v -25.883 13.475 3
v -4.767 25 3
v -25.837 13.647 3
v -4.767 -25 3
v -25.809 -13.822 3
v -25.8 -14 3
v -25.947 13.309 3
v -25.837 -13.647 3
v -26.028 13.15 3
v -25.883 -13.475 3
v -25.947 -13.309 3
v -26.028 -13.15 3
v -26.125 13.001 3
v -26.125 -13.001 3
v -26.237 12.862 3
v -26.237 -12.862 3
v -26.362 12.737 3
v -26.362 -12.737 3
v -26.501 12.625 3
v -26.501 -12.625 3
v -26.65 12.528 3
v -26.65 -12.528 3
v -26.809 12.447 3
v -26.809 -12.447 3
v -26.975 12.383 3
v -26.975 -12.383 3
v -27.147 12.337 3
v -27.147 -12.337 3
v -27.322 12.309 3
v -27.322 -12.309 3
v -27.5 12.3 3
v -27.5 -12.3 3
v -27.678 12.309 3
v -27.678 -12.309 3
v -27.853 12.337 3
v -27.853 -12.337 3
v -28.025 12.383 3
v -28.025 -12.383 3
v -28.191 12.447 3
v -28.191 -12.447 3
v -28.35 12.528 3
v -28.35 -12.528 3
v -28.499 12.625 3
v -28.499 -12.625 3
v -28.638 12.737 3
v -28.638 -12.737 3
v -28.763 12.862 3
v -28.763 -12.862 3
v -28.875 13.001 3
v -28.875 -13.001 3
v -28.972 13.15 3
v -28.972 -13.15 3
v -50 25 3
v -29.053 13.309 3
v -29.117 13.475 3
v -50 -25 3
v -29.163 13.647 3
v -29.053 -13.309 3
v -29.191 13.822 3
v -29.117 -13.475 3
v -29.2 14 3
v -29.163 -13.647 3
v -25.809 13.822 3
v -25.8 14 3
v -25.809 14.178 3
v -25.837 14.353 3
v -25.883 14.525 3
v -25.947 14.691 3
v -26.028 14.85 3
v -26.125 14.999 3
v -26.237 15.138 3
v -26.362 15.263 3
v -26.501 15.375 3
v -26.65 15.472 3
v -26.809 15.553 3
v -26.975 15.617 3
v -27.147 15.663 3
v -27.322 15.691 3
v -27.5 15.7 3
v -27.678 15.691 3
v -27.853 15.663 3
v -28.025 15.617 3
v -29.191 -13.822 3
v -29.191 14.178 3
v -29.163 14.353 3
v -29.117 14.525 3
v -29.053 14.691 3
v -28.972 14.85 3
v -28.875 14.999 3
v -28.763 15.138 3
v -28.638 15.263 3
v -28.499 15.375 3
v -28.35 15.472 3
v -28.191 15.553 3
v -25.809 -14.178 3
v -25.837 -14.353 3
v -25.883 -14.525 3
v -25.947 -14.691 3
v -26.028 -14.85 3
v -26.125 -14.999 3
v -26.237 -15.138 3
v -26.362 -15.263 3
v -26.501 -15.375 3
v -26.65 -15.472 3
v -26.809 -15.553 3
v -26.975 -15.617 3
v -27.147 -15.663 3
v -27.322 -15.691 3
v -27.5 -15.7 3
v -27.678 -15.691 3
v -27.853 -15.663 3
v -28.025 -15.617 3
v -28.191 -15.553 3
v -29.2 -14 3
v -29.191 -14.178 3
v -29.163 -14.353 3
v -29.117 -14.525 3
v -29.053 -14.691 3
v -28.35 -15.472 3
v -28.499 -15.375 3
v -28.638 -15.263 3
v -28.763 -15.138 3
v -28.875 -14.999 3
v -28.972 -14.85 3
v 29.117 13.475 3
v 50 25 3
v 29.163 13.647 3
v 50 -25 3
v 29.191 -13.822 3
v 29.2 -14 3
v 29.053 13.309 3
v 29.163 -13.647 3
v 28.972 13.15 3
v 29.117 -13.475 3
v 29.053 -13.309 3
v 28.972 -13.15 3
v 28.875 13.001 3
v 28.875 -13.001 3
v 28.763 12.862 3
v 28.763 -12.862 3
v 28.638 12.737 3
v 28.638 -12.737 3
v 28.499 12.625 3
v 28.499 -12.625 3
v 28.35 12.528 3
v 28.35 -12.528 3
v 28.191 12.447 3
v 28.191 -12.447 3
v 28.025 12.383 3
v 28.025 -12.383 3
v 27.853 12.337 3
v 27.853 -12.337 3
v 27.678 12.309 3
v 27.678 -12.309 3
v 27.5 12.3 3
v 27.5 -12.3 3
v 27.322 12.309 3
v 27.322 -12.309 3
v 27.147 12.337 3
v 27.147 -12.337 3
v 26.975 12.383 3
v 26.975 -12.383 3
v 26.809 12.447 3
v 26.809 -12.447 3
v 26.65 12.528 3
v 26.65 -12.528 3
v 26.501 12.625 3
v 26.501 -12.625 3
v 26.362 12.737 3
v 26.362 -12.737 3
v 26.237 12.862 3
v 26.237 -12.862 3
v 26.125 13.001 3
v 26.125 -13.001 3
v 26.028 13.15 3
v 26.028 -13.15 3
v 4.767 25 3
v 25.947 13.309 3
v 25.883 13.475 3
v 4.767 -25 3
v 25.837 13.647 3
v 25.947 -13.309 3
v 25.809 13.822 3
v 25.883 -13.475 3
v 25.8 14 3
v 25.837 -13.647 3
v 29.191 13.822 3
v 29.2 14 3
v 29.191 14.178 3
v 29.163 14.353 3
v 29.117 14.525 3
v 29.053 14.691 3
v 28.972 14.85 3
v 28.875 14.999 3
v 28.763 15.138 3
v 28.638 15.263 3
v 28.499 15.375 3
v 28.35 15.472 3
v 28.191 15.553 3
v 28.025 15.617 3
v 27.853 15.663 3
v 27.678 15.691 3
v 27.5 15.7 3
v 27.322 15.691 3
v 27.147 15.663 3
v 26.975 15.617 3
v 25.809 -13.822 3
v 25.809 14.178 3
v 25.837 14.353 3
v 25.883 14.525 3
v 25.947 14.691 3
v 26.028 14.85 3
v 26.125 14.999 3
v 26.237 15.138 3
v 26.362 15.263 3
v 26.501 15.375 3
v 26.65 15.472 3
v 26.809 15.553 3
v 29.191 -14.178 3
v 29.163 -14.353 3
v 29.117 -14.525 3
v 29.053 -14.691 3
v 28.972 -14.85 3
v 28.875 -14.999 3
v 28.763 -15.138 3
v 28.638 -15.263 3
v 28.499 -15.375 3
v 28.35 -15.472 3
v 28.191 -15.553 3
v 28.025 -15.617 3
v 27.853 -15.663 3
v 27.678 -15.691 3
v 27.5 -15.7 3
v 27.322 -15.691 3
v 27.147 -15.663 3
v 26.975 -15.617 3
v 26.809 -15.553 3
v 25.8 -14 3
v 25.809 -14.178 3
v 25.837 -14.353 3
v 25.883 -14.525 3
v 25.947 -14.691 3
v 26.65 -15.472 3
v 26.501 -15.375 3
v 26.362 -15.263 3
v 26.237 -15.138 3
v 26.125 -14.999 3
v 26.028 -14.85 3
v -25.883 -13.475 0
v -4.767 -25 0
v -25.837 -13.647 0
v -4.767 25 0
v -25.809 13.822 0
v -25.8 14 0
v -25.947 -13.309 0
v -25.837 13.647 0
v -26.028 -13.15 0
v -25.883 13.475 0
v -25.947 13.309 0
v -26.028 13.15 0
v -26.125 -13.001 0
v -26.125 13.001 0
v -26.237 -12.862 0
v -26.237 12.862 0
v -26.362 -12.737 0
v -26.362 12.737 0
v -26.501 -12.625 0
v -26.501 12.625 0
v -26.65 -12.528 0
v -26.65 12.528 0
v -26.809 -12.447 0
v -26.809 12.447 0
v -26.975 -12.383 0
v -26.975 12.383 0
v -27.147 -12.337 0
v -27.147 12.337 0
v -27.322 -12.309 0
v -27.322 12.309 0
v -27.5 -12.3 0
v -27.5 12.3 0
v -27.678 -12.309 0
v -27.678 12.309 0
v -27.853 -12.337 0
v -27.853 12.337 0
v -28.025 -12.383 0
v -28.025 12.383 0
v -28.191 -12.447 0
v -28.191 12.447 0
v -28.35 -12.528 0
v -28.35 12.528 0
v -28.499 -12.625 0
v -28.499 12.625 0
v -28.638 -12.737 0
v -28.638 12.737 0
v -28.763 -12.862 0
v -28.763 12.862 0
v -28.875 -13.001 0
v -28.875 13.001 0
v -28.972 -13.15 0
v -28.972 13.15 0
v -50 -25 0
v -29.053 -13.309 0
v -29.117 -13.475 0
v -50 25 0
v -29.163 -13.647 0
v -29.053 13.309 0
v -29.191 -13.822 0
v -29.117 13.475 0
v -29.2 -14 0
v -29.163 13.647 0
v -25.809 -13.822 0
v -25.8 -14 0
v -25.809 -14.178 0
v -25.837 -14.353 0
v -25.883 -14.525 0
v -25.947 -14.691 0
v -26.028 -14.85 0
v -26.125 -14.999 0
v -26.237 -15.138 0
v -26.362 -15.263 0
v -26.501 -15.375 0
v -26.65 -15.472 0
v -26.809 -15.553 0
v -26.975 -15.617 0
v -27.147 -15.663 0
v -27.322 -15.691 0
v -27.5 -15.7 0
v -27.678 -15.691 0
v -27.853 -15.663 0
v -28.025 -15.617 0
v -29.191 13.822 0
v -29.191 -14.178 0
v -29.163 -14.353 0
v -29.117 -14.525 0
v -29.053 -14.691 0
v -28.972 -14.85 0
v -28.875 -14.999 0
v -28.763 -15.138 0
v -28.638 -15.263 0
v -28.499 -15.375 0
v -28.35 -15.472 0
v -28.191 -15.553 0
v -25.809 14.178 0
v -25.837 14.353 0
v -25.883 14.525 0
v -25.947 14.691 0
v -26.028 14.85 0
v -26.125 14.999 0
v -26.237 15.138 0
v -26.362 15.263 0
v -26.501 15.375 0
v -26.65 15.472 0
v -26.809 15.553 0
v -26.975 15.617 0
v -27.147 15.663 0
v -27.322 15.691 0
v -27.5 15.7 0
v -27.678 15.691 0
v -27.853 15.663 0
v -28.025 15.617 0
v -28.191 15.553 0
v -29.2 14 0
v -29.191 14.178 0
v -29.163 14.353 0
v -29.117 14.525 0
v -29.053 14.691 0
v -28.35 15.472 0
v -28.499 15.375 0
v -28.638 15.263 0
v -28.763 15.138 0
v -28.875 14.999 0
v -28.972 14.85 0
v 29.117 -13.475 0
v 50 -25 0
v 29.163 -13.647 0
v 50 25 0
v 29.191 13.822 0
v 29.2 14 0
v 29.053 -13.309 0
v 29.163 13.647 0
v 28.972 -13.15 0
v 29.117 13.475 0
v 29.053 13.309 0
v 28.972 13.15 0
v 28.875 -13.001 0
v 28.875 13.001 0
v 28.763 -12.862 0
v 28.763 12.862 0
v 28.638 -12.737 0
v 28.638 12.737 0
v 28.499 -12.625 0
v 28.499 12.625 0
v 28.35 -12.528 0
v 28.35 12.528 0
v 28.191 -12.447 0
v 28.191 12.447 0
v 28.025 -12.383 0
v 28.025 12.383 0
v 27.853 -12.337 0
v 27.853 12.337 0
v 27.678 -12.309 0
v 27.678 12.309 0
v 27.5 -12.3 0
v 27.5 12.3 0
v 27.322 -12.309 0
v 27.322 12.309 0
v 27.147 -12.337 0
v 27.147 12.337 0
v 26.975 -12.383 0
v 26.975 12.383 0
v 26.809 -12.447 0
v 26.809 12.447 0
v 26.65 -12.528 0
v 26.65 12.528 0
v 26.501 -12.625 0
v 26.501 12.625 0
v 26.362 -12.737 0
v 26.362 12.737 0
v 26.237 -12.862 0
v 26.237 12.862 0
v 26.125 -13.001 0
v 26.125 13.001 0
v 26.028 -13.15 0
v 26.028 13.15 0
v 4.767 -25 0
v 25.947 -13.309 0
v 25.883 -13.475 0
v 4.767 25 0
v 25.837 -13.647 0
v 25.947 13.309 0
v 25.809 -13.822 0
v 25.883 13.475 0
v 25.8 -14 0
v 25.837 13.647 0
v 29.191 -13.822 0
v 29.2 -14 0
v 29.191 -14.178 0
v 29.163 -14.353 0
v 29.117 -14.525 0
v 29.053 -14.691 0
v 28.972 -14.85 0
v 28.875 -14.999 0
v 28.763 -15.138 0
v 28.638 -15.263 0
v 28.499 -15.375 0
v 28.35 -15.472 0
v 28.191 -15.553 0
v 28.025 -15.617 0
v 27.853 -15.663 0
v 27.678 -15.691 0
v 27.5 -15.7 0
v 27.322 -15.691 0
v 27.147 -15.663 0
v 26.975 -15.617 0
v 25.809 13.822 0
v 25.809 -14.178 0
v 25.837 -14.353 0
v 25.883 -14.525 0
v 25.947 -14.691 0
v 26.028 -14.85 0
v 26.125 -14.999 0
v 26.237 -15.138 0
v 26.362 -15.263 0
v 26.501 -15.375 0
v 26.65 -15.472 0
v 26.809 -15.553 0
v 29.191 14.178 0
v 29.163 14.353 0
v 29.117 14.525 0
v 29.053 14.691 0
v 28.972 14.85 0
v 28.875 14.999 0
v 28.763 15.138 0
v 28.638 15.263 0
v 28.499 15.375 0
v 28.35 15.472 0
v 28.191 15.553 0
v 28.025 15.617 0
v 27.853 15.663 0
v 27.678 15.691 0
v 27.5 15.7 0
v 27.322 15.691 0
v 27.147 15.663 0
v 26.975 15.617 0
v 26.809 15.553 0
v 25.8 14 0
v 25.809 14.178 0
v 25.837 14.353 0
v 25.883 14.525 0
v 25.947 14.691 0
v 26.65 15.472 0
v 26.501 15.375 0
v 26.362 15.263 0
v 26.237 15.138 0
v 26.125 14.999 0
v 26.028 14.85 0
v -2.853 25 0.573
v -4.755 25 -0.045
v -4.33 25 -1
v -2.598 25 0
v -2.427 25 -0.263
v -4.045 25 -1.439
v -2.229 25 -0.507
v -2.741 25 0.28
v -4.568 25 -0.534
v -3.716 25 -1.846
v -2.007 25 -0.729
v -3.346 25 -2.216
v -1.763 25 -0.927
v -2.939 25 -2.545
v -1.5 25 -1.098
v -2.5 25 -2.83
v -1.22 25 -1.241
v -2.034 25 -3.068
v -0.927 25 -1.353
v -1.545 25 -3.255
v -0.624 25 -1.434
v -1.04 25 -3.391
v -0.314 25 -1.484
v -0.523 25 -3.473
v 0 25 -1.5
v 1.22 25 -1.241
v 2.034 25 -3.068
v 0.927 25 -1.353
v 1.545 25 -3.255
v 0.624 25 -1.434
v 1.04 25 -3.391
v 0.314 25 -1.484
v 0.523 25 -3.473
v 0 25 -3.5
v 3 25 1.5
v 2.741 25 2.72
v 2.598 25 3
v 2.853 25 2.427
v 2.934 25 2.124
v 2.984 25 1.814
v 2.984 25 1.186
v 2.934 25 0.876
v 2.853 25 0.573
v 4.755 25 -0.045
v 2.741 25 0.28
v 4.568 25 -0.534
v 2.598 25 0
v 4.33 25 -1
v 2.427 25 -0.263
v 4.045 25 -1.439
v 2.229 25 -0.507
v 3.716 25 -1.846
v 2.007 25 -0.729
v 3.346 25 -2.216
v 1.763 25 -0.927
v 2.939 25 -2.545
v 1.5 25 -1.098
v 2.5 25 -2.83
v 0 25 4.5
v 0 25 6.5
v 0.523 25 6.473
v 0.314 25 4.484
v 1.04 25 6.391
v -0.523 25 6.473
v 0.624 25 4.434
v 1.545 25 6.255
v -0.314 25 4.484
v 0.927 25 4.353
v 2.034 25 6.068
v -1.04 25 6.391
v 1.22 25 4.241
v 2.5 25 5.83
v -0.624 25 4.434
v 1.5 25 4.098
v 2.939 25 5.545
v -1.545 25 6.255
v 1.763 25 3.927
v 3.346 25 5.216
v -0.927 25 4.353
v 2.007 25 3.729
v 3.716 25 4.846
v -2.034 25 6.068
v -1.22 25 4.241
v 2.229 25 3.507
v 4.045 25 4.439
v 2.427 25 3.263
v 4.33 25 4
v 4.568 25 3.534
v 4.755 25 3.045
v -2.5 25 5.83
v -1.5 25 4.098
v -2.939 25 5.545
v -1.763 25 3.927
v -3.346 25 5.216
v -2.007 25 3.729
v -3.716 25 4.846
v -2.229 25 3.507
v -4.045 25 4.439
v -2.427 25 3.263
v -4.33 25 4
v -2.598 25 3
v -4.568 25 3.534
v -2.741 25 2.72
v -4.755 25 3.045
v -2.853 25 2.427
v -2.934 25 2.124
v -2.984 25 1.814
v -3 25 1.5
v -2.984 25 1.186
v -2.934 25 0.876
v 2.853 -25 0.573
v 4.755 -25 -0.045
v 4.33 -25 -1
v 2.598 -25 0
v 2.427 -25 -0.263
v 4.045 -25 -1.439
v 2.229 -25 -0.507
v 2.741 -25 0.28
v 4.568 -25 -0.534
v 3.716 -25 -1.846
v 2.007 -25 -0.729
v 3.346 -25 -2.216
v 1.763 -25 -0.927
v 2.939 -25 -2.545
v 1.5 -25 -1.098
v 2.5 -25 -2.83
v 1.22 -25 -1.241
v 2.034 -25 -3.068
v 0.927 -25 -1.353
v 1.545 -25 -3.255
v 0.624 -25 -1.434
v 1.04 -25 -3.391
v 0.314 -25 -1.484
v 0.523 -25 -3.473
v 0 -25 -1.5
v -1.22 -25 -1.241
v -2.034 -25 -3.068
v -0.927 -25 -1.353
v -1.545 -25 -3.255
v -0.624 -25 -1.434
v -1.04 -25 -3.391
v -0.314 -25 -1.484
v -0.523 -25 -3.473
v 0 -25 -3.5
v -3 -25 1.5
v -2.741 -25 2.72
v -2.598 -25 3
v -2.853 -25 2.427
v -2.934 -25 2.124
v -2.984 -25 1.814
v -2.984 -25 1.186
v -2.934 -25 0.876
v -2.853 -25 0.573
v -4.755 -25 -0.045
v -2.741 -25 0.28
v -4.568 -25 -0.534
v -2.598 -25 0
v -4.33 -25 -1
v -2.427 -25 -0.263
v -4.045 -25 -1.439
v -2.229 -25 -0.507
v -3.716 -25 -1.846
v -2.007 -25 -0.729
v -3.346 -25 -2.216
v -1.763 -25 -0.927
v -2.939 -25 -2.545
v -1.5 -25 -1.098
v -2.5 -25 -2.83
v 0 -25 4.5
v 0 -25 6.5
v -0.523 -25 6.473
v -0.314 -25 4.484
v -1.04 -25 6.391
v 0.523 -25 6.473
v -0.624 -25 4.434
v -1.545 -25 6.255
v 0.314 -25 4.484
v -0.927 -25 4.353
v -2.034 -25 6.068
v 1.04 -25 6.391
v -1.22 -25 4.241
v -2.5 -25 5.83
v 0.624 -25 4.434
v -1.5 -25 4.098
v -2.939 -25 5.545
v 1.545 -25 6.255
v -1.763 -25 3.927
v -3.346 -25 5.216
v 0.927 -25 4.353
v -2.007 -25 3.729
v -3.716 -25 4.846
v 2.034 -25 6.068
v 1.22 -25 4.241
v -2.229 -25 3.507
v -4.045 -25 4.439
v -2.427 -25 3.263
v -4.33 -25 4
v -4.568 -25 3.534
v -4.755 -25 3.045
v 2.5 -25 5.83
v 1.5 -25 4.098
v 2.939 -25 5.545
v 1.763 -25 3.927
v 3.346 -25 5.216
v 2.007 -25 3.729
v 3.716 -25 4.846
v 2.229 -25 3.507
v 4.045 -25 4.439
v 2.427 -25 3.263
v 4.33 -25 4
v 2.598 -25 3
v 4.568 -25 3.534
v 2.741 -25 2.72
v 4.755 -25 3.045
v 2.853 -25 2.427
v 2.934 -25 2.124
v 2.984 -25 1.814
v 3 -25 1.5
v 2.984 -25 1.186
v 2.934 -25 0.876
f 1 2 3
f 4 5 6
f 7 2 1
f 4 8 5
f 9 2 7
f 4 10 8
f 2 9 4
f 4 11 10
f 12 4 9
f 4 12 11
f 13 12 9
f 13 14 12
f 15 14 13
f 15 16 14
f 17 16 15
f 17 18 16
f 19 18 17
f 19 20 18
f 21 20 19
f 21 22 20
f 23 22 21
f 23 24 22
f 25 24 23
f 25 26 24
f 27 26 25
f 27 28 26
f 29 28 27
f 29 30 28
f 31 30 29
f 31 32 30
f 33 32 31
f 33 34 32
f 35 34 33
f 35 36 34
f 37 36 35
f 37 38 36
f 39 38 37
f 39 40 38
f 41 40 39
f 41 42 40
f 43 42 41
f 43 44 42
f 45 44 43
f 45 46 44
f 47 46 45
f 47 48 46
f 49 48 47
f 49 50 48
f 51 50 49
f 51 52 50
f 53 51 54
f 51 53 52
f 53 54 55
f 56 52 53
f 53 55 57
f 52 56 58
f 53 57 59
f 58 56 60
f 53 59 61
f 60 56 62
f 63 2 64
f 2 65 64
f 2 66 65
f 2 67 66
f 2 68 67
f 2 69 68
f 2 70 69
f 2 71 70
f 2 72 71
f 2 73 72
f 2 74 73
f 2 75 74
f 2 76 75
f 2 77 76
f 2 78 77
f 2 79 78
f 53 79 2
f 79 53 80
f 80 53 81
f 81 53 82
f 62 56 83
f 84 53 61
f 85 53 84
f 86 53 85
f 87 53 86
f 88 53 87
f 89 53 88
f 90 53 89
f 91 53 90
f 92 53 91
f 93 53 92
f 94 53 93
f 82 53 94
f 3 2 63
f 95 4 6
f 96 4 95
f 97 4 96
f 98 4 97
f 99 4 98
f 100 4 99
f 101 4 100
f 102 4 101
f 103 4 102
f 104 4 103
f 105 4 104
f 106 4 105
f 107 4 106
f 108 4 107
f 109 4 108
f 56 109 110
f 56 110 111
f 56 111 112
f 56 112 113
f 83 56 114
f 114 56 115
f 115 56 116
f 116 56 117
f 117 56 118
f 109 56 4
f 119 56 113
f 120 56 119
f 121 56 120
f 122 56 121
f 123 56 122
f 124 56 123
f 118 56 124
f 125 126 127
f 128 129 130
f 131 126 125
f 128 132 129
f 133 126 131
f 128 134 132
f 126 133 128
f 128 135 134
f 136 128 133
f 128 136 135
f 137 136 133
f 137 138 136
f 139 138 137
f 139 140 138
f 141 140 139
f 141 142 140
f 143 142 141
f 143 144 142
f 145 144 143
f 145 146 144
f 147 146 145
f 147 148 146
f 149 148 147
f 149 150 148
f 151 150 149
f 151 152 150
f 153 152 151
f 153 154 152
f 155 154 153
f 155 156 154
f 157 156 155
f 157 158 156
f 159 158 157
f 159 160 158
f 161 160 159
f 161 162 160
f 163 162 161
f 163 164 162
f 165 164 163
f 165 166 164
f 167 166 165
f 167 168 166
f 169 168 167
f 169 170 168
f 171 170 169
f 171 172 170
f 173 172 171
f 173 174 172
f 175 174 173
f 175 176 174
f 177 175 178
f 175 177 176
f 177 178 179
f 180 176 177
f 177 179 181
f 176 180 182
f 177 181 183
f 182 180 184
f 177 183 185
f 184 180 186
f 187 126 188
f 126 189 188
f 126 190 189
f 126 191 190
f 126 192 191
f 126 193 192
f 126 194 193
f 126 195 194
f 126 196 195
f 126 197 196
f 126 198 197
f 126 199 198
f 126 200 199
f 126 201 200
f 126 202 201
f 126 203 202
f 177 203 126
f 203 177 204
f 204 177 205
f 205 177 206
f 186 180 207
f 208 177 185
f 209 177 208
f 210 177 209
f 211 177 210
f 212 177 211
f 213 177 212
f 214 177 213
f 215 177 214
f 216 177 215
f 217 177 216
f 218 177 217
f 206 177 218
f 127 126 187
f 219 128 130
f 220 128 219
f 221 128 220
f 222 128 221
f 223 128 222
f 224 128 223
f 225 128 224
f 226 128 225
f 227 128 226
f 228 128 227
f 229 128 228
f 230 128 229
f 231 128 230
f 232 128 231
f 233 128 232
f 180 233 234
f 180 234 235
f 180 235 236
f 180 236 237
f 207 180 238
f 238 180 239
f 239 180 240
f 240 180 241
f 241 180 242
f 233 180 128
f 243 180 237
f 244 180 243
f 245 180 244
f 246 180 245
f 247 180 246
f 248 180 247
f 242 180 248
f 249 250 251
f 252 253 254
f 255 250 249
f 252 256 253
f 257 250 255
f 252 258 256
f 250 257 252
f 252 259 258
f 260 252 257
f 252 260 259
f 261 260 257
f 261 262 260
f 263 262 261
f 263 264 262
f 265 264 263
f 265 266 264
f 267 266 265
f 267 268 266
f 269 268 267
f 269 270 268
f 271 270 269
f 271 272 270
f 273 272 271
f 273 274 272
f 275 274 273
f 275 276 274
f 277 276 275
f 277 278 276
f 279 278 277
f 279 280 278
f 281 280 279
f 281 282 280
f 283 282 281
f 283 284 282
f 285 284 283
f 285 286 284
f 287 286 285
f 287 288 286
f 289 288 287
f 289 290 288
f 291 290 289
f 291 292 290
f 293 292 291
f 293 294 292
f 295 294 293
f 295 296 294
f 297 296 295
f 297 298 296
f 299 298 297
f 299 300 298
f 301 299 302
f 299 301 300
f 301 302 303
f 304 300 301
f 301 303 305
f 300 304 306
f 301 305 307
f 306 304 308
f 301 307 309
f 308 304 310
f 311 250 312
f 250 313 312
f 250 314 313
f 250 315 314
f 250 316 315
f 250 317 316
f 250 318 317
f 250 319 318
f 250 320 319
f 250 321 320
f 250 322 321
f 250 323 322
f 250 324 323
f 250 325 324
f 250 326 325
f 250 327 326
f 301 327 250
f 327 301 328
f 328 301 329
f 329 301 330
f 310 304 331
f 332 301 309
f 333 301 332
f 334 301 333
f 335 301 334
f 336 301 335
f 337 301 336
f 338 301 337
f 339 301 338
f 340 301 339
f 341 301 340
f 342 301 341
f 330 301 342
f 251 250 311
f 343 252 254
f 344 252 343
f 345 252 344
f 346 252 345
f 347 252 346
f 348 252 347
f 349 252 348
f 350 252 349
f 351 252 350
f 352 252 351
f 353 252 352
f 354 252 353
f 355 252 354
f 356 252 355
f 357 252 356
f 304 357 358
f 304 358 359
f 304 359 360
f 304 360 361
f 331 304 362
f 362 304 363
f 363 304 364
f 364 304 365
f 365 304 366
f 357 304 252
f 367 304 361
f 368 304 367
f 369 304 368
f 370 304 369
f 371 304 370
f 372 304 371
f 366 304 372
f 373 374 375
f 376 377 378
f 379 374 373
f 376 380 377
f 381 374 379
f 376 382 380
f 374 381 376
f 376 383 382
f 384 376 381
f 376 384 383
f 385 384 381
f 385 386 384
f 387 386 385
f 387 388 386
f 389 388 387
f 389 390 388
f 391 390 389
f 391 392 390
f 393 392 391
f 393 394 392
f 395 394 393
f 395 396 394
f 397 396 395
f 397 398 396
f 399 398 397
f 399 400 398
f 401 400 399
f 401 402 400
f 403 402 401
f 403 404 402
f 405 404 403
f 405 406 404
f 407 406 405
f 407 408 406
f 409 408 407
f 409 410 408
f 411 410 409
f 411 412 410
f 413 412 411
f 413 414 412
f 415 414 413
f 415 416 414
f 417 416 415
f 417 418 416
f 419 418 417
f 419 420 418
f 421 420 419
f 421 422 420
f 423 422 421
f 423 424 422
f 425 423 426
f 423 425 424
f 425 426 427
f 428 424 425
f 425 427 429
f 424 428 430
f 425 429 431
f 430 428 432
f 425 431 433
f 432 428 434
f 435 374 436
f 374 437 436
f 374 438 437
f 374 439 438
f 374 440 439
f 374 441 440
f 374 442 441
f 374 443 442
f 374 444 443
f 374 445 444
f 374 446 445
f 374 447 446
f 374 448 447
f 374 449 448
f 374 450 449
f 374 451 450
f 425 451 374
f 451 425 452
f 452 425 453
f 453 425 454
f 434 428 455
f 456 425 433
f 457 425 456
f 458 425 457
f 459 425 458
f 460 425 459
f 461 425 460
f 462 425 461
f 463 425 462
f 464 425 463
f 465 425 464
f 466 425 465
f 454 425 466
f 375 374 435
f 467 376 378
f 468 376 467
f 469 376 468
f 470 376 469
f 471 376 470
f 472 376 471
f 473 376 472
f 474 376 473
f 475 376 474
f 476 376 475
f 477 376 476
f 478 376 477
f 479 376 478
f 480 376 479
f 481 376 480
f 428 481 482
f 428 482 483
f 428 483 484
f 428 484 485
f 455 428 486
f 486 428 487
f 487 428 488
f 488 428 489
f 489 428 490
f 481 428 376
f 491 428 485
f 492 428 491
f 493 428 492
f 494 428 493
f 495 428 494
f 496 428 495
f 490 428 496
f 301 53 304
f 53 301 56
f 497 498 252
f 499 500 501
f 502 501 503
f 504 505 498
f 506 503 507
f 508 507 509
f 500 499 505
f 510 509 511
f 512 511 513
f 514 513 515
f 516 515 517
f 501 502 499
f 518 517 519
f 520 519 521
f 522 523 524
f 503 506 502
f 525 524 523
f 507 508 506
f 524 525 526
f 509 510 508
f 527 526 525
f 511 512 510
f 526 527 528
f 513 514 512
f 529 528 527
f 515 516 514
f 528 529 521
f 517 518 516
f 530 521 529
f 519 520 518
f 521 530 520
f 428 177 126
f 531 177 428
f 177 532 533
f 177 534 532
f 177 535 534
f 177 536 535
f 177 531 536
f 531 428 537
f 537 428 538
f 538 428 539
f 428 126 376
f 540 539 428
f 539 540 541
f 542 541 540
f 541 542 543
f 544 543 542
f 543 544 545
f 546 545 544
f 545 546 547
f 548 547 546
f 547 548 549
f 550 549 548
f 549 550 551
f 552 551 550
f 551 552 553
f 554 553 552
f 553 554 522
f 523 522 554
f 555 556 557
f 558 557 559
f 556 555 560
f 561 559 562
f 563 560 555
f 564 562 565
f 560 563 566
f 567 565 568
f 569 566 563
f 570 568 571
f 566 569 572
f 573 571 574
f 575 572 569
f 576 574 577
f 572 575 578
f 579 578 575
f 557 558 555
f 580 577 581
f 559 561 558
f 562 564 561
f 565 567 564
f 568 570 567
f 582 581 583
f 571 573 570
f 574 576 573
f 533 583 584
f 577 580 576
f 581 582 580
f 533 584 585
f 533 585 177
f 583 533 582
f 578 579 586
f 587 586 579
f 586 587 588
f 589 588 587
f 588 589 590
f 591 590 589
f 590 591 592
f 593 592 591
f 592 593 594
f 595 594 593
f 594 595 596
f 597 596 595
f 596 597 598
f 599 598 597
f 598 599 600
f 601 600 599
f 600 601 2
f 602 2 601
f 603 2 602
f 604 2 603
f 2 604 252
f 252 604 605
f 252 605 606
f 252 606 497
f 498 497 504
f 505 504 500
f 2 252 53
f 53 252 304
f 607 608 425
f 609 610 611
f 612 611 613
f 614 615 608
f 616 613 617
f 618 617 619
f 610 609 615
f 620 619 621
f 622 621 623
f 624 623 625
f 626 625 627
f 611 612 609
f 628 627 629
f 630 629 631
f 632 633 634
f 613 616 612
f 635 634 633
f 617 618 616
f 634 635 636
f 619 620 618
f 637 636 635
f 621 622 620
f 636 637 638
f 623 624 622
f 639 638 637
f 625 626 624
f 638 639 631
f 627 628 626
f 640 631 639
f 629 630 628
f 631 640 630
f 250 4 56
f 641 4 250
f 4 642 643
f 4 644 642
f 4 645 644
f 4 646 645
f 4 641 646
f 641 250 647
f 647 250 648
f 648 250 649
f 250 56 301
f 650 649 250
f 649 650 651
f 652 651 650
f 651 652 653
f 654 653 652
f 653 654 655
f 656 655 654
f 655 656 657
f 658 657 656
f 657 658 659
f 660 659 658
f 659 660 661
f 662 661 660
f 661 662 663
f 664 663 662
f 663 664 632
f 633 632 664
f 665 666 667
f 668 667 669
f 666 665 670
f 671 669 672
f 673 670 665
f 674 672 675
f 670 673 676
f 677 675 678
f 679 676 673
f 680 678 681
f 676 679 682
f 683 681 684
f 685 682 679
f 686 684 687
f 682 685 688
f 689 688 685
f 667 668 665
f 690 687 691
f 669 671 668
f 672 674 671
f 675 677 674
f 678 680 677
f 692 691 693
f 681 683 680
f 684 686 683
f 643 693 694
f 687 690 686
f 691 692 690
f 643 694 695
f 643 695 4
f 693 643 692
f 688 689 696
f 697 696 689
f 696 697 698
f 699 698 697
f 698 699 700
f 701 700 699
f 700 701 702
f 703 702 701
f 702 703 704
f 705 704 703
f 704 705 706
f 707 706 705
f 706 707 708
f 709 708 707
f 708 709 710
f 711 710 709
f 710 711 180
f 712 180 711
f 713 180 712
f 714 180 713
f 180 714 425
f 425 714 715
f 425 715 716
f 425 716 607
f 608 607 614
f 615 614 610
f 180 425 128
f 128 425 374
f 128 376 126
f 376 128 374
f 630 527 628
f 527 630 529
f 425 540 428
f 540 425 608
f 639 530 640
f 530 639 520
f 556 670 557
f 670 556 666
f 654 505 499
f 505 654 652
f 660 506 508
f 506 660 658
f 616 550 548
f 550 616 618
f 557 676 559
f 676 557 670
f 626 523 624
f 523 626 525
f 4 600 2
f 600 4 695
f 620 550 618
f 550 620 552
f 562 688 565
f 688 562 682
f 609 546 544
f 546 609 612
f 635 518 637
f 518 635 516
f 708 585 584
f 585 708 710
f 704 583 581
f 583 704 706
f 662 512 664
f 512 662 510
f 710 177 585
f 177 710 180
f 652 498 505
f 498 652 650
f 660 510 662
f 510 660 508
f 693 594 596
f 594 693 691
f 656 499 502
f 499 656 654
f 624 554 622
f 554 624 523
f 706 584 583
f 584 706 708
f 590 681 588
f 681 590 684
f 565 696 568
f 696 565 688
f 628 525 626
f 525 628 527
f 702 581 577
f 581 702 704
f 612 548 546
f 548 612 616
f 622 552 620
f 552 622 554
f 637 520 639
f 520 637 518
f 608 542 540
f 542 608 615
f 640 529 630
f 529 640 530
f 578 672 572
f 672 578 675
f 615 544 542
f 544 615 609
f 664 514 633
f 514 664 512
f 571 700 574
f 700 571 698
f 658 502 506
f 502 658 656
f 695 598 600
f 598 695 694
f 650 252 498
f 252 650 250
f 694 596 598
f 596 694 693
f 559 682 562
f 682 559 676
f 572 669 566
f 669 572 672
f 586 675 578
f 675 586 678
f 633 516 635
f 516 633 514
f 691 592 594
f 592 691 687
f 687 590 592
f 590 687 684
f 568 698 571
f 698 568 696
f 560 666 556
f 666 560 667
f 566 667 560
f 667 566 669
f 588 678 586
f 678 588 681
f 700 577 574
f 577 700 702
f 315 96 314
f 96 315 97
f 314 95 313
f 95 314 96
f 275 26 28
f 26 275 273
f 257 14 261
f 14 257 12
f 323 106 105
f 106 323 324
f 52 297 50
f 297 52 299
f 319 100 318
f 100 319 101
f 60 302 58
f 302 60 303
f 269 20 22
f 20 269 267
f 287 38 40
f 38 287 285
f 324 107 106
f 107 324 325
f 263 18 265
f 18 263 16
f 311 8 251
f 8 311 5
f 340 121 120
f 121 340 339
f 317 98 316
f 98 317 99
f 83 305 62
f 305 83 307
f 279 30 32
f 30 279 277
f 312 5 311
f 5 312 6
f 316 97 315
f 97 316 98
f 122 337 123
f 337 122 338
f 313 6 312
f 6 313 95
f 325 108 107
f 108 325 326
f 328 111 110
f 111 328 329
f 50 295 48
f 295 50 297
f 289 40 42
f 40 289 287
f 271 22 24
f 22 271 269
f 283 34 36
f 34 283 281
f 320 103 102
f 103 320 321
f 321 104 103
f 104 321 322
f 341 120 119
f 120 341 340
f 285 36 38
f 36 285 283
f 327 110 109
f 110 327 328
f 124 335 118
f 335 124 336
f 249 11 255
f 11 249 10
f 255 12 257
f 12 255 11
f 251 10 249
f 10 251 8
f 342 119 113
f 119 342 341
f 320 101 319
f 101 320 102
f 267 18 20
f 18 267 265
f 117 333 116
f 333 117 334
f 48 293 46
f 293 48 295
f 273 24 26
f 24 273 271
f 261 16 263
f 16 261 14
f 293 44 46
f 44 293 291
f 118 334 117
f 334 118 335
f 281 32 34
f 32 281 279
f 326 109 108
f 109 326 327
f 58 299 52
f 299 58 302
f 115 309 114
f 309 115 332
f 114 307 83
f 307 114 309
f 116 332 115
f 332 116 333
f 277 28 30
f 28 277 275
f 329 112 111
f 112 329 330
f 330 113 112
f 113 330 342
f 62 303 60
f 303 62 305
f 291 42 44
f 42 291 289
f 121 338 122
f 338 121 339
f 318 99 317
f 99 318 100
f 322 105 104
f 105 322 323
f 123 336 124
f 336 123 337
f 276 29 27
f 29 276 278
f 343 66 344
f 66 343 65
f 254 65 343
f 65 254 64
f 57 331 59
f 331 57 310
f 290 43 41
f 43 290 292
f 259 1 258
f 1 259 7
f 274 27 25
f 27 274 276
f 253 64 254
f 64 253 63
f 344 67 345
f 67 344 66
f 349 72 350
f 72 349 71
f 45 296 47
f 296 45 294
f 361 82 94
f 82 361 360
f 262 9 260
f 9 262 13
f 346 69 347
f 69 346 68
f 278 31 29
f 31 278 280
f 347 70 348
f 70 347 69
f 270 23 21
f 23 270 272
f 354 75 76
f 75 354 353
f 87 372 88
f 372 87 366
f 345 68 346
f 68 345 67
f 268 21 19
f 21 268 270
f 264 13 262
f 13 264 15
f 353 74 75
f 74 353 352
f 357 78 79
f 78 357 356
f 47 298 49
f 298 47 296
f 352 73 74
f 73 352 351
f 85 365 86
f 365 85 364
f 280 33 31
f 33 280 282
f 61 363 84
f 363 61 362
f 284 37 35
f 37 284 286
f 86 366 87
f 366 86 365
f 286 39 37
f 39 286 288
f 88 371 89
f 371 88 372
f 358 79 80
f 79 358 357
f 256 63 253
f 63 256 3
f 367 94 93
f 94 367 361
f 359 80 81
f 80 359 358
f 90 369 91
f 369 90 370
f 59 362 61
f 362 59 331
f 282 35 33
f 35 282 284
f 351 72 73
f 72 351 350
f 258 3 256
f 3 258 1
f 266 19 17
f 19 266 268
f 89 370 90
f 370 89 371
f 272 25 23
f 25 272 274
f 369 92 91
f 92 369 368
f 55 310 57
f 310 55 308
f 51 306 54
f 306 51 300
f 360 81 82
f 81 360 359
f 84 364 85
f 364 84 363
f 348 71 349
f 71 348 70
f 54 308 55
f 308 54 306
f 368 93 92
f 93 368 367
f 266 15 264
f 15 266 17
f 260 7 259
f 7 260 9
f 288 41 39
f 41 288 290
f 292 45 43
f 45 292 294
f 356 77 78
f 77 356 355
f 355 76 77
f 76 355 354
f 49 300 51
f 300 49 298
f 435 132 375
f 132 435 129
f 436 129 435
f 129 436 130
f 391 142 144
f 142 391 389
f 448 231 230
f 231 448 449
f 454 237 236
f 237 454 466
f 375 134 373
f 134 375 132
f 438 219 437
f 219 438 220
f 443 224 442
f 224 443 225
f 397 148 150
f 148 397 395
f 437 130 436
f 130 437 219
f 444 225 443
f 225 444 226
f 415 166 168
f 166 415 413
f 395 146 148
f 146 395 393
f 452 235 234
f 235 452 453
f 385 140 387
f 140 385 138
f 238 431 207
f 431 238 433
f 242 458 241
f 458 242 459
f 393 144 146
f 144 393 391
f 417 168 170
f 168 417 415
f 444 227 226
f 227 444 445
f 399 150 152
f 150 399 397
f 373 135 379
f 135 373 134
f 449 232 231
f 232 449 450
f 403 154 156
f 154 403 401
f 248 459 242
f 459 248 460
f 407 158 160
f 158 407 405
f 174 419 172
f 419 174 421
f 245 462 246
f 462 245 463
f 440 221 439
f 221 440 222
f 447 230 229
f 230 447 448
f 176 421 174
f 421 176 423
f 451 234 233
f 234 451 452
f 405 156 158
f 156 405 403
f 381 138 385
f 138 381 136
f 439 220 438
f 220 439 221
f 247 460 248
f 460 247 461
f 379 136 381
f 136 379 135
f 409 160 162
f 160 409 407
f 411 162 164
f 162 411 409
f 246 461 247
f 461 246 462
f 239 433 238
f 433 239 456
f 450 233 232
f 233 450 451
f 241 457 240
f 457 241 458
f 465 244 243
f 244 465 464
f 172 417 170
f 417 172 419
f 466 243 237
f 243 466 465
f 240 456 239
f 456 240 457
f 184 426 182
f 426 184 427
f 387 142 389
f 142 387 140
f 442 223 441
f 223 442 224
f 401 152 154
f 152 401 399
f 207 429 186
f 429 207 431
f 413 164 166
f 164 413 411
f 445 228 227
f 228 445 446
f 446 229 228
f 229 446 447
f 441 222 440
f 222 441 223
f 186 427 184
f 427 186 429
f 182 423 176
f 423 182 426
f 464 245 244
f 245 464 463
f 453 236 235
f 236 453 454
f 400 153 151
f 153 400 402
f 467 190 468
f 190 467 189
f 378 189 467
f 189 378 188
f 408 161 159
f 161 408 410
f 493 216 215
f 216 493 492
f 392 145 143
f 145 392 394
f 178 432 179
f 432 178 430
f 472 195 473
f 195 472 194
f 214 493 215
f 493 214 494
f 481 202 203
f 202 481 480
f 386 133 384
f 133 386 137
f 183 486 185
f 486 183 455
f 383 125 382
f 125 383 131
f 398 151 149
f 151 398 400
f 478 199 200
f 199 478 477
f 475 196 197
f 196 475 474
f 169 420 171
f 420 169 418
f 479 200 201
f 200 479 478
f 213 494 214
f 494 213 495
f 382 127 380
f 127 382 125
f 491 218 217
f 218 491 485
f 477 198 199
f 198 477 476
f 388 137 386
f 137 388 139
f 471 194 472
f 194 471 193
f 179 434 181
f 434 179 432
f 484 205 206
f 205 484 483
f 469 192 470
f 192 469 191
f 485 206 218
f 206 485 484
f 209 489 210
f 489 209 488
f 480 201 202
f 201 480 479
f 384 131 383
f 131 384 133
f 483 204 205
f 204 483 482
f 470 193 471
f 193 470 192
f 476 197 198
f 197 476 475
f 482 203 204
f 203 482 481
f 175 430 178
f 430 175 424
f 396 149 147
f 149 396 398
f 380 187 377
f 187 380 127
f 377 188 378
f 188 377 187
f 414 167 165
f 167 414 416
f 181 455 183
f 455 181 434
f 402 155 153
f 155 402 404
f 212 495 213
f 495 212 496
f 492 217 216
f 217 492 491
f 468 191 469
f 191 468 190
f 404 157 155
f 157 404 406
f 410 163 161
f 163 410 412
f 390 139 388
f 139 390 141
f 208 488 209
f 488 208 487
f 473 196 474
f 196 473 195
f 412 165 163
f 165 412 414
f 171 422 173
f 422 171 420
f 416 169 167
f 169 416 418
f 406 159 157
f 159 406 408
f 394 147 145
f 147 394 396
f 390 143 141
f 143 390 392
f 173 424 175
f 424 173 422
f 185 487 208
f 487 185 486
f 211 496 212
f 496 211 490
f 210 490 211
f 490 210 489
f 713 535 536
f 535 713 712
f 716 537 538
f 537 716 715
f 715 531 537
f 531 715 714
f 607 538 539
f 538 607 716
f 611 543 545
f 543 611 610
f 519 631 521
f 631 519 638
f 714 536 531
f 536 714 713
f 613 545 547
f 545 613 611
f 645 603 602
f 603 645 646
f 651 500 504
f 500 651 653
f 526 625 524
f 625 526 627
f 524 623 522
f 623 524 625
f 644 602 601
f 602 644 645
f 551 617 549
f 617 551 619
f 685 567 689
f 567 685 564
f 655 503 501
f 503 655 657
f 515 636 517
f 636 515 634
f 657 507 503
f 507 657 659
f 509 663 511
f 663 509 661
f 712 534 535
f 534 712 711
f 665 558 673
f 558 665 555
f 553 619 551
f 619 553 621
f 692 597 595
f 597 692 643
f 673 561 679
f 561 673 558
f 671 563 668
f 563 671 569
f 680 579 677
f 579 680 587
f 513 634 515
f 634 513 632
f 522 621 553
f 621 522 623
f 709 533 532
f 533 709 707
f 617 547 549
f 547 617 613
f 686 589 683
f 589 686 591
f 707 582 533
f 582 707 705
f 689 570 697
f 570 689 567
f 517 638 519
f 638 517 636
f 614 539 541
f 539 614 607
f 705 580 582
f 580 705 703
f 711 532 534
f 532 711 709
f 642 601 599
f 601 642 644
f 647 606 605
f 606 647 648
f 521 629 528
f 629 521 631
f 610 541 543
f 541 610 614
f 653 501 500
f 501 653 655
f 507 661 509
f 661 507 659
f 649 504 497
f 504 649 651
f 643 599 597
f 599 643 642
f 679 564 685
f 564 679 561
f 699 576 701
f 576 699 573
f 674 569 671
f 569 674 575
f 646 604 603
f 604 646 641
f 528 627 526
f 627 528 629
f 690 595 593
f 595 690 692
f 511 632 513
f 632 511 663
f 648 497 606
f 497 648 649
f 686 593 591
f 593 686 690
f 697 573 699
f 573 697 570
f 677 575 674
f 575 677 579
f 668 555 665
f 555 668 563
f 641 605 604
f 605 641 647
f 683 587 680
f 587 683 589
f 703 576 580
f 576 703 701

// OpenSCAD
// Two-leaf hinge with a printable straight pin barrel.
$fn = 60;
eps = 0.02;
leaf_l = 50;
leaf_w = 50;
leaf_t = 3;
pin_d = 6;
barrel_d = pin_d + 4;
difference() {
    union() {
        translate([-leaf_l, -leaf_w / 2, 0]) cube([leaf_l, leaf_w, leaf_t]);
        translate([0, -leaf_w / 2, 0]) cube([leaf_l, leaf_w, leaf_t]);
        translate([0, -leaf_w / 2, leaf_t / 2]) rotate([-90, 0, 0]) cylinder(d = barrel_d, h = leaf_w);
    }
    translate([0, -leaf_w / 2 - eps, leaf_t / 2]) rotate([-90, 0, 0]) cylinder(d = pin_d, h = leaf_w + 2 * eps);
    for (x = [-leaf_l * 0.55, leaf_l * 0.55], y = [-leaf_w * 0.28, leaf_w * 0.28])
        translate([x, y, -eps]) cylinder(d = 3.4, h = leaf_t + 2 * eps);
}
